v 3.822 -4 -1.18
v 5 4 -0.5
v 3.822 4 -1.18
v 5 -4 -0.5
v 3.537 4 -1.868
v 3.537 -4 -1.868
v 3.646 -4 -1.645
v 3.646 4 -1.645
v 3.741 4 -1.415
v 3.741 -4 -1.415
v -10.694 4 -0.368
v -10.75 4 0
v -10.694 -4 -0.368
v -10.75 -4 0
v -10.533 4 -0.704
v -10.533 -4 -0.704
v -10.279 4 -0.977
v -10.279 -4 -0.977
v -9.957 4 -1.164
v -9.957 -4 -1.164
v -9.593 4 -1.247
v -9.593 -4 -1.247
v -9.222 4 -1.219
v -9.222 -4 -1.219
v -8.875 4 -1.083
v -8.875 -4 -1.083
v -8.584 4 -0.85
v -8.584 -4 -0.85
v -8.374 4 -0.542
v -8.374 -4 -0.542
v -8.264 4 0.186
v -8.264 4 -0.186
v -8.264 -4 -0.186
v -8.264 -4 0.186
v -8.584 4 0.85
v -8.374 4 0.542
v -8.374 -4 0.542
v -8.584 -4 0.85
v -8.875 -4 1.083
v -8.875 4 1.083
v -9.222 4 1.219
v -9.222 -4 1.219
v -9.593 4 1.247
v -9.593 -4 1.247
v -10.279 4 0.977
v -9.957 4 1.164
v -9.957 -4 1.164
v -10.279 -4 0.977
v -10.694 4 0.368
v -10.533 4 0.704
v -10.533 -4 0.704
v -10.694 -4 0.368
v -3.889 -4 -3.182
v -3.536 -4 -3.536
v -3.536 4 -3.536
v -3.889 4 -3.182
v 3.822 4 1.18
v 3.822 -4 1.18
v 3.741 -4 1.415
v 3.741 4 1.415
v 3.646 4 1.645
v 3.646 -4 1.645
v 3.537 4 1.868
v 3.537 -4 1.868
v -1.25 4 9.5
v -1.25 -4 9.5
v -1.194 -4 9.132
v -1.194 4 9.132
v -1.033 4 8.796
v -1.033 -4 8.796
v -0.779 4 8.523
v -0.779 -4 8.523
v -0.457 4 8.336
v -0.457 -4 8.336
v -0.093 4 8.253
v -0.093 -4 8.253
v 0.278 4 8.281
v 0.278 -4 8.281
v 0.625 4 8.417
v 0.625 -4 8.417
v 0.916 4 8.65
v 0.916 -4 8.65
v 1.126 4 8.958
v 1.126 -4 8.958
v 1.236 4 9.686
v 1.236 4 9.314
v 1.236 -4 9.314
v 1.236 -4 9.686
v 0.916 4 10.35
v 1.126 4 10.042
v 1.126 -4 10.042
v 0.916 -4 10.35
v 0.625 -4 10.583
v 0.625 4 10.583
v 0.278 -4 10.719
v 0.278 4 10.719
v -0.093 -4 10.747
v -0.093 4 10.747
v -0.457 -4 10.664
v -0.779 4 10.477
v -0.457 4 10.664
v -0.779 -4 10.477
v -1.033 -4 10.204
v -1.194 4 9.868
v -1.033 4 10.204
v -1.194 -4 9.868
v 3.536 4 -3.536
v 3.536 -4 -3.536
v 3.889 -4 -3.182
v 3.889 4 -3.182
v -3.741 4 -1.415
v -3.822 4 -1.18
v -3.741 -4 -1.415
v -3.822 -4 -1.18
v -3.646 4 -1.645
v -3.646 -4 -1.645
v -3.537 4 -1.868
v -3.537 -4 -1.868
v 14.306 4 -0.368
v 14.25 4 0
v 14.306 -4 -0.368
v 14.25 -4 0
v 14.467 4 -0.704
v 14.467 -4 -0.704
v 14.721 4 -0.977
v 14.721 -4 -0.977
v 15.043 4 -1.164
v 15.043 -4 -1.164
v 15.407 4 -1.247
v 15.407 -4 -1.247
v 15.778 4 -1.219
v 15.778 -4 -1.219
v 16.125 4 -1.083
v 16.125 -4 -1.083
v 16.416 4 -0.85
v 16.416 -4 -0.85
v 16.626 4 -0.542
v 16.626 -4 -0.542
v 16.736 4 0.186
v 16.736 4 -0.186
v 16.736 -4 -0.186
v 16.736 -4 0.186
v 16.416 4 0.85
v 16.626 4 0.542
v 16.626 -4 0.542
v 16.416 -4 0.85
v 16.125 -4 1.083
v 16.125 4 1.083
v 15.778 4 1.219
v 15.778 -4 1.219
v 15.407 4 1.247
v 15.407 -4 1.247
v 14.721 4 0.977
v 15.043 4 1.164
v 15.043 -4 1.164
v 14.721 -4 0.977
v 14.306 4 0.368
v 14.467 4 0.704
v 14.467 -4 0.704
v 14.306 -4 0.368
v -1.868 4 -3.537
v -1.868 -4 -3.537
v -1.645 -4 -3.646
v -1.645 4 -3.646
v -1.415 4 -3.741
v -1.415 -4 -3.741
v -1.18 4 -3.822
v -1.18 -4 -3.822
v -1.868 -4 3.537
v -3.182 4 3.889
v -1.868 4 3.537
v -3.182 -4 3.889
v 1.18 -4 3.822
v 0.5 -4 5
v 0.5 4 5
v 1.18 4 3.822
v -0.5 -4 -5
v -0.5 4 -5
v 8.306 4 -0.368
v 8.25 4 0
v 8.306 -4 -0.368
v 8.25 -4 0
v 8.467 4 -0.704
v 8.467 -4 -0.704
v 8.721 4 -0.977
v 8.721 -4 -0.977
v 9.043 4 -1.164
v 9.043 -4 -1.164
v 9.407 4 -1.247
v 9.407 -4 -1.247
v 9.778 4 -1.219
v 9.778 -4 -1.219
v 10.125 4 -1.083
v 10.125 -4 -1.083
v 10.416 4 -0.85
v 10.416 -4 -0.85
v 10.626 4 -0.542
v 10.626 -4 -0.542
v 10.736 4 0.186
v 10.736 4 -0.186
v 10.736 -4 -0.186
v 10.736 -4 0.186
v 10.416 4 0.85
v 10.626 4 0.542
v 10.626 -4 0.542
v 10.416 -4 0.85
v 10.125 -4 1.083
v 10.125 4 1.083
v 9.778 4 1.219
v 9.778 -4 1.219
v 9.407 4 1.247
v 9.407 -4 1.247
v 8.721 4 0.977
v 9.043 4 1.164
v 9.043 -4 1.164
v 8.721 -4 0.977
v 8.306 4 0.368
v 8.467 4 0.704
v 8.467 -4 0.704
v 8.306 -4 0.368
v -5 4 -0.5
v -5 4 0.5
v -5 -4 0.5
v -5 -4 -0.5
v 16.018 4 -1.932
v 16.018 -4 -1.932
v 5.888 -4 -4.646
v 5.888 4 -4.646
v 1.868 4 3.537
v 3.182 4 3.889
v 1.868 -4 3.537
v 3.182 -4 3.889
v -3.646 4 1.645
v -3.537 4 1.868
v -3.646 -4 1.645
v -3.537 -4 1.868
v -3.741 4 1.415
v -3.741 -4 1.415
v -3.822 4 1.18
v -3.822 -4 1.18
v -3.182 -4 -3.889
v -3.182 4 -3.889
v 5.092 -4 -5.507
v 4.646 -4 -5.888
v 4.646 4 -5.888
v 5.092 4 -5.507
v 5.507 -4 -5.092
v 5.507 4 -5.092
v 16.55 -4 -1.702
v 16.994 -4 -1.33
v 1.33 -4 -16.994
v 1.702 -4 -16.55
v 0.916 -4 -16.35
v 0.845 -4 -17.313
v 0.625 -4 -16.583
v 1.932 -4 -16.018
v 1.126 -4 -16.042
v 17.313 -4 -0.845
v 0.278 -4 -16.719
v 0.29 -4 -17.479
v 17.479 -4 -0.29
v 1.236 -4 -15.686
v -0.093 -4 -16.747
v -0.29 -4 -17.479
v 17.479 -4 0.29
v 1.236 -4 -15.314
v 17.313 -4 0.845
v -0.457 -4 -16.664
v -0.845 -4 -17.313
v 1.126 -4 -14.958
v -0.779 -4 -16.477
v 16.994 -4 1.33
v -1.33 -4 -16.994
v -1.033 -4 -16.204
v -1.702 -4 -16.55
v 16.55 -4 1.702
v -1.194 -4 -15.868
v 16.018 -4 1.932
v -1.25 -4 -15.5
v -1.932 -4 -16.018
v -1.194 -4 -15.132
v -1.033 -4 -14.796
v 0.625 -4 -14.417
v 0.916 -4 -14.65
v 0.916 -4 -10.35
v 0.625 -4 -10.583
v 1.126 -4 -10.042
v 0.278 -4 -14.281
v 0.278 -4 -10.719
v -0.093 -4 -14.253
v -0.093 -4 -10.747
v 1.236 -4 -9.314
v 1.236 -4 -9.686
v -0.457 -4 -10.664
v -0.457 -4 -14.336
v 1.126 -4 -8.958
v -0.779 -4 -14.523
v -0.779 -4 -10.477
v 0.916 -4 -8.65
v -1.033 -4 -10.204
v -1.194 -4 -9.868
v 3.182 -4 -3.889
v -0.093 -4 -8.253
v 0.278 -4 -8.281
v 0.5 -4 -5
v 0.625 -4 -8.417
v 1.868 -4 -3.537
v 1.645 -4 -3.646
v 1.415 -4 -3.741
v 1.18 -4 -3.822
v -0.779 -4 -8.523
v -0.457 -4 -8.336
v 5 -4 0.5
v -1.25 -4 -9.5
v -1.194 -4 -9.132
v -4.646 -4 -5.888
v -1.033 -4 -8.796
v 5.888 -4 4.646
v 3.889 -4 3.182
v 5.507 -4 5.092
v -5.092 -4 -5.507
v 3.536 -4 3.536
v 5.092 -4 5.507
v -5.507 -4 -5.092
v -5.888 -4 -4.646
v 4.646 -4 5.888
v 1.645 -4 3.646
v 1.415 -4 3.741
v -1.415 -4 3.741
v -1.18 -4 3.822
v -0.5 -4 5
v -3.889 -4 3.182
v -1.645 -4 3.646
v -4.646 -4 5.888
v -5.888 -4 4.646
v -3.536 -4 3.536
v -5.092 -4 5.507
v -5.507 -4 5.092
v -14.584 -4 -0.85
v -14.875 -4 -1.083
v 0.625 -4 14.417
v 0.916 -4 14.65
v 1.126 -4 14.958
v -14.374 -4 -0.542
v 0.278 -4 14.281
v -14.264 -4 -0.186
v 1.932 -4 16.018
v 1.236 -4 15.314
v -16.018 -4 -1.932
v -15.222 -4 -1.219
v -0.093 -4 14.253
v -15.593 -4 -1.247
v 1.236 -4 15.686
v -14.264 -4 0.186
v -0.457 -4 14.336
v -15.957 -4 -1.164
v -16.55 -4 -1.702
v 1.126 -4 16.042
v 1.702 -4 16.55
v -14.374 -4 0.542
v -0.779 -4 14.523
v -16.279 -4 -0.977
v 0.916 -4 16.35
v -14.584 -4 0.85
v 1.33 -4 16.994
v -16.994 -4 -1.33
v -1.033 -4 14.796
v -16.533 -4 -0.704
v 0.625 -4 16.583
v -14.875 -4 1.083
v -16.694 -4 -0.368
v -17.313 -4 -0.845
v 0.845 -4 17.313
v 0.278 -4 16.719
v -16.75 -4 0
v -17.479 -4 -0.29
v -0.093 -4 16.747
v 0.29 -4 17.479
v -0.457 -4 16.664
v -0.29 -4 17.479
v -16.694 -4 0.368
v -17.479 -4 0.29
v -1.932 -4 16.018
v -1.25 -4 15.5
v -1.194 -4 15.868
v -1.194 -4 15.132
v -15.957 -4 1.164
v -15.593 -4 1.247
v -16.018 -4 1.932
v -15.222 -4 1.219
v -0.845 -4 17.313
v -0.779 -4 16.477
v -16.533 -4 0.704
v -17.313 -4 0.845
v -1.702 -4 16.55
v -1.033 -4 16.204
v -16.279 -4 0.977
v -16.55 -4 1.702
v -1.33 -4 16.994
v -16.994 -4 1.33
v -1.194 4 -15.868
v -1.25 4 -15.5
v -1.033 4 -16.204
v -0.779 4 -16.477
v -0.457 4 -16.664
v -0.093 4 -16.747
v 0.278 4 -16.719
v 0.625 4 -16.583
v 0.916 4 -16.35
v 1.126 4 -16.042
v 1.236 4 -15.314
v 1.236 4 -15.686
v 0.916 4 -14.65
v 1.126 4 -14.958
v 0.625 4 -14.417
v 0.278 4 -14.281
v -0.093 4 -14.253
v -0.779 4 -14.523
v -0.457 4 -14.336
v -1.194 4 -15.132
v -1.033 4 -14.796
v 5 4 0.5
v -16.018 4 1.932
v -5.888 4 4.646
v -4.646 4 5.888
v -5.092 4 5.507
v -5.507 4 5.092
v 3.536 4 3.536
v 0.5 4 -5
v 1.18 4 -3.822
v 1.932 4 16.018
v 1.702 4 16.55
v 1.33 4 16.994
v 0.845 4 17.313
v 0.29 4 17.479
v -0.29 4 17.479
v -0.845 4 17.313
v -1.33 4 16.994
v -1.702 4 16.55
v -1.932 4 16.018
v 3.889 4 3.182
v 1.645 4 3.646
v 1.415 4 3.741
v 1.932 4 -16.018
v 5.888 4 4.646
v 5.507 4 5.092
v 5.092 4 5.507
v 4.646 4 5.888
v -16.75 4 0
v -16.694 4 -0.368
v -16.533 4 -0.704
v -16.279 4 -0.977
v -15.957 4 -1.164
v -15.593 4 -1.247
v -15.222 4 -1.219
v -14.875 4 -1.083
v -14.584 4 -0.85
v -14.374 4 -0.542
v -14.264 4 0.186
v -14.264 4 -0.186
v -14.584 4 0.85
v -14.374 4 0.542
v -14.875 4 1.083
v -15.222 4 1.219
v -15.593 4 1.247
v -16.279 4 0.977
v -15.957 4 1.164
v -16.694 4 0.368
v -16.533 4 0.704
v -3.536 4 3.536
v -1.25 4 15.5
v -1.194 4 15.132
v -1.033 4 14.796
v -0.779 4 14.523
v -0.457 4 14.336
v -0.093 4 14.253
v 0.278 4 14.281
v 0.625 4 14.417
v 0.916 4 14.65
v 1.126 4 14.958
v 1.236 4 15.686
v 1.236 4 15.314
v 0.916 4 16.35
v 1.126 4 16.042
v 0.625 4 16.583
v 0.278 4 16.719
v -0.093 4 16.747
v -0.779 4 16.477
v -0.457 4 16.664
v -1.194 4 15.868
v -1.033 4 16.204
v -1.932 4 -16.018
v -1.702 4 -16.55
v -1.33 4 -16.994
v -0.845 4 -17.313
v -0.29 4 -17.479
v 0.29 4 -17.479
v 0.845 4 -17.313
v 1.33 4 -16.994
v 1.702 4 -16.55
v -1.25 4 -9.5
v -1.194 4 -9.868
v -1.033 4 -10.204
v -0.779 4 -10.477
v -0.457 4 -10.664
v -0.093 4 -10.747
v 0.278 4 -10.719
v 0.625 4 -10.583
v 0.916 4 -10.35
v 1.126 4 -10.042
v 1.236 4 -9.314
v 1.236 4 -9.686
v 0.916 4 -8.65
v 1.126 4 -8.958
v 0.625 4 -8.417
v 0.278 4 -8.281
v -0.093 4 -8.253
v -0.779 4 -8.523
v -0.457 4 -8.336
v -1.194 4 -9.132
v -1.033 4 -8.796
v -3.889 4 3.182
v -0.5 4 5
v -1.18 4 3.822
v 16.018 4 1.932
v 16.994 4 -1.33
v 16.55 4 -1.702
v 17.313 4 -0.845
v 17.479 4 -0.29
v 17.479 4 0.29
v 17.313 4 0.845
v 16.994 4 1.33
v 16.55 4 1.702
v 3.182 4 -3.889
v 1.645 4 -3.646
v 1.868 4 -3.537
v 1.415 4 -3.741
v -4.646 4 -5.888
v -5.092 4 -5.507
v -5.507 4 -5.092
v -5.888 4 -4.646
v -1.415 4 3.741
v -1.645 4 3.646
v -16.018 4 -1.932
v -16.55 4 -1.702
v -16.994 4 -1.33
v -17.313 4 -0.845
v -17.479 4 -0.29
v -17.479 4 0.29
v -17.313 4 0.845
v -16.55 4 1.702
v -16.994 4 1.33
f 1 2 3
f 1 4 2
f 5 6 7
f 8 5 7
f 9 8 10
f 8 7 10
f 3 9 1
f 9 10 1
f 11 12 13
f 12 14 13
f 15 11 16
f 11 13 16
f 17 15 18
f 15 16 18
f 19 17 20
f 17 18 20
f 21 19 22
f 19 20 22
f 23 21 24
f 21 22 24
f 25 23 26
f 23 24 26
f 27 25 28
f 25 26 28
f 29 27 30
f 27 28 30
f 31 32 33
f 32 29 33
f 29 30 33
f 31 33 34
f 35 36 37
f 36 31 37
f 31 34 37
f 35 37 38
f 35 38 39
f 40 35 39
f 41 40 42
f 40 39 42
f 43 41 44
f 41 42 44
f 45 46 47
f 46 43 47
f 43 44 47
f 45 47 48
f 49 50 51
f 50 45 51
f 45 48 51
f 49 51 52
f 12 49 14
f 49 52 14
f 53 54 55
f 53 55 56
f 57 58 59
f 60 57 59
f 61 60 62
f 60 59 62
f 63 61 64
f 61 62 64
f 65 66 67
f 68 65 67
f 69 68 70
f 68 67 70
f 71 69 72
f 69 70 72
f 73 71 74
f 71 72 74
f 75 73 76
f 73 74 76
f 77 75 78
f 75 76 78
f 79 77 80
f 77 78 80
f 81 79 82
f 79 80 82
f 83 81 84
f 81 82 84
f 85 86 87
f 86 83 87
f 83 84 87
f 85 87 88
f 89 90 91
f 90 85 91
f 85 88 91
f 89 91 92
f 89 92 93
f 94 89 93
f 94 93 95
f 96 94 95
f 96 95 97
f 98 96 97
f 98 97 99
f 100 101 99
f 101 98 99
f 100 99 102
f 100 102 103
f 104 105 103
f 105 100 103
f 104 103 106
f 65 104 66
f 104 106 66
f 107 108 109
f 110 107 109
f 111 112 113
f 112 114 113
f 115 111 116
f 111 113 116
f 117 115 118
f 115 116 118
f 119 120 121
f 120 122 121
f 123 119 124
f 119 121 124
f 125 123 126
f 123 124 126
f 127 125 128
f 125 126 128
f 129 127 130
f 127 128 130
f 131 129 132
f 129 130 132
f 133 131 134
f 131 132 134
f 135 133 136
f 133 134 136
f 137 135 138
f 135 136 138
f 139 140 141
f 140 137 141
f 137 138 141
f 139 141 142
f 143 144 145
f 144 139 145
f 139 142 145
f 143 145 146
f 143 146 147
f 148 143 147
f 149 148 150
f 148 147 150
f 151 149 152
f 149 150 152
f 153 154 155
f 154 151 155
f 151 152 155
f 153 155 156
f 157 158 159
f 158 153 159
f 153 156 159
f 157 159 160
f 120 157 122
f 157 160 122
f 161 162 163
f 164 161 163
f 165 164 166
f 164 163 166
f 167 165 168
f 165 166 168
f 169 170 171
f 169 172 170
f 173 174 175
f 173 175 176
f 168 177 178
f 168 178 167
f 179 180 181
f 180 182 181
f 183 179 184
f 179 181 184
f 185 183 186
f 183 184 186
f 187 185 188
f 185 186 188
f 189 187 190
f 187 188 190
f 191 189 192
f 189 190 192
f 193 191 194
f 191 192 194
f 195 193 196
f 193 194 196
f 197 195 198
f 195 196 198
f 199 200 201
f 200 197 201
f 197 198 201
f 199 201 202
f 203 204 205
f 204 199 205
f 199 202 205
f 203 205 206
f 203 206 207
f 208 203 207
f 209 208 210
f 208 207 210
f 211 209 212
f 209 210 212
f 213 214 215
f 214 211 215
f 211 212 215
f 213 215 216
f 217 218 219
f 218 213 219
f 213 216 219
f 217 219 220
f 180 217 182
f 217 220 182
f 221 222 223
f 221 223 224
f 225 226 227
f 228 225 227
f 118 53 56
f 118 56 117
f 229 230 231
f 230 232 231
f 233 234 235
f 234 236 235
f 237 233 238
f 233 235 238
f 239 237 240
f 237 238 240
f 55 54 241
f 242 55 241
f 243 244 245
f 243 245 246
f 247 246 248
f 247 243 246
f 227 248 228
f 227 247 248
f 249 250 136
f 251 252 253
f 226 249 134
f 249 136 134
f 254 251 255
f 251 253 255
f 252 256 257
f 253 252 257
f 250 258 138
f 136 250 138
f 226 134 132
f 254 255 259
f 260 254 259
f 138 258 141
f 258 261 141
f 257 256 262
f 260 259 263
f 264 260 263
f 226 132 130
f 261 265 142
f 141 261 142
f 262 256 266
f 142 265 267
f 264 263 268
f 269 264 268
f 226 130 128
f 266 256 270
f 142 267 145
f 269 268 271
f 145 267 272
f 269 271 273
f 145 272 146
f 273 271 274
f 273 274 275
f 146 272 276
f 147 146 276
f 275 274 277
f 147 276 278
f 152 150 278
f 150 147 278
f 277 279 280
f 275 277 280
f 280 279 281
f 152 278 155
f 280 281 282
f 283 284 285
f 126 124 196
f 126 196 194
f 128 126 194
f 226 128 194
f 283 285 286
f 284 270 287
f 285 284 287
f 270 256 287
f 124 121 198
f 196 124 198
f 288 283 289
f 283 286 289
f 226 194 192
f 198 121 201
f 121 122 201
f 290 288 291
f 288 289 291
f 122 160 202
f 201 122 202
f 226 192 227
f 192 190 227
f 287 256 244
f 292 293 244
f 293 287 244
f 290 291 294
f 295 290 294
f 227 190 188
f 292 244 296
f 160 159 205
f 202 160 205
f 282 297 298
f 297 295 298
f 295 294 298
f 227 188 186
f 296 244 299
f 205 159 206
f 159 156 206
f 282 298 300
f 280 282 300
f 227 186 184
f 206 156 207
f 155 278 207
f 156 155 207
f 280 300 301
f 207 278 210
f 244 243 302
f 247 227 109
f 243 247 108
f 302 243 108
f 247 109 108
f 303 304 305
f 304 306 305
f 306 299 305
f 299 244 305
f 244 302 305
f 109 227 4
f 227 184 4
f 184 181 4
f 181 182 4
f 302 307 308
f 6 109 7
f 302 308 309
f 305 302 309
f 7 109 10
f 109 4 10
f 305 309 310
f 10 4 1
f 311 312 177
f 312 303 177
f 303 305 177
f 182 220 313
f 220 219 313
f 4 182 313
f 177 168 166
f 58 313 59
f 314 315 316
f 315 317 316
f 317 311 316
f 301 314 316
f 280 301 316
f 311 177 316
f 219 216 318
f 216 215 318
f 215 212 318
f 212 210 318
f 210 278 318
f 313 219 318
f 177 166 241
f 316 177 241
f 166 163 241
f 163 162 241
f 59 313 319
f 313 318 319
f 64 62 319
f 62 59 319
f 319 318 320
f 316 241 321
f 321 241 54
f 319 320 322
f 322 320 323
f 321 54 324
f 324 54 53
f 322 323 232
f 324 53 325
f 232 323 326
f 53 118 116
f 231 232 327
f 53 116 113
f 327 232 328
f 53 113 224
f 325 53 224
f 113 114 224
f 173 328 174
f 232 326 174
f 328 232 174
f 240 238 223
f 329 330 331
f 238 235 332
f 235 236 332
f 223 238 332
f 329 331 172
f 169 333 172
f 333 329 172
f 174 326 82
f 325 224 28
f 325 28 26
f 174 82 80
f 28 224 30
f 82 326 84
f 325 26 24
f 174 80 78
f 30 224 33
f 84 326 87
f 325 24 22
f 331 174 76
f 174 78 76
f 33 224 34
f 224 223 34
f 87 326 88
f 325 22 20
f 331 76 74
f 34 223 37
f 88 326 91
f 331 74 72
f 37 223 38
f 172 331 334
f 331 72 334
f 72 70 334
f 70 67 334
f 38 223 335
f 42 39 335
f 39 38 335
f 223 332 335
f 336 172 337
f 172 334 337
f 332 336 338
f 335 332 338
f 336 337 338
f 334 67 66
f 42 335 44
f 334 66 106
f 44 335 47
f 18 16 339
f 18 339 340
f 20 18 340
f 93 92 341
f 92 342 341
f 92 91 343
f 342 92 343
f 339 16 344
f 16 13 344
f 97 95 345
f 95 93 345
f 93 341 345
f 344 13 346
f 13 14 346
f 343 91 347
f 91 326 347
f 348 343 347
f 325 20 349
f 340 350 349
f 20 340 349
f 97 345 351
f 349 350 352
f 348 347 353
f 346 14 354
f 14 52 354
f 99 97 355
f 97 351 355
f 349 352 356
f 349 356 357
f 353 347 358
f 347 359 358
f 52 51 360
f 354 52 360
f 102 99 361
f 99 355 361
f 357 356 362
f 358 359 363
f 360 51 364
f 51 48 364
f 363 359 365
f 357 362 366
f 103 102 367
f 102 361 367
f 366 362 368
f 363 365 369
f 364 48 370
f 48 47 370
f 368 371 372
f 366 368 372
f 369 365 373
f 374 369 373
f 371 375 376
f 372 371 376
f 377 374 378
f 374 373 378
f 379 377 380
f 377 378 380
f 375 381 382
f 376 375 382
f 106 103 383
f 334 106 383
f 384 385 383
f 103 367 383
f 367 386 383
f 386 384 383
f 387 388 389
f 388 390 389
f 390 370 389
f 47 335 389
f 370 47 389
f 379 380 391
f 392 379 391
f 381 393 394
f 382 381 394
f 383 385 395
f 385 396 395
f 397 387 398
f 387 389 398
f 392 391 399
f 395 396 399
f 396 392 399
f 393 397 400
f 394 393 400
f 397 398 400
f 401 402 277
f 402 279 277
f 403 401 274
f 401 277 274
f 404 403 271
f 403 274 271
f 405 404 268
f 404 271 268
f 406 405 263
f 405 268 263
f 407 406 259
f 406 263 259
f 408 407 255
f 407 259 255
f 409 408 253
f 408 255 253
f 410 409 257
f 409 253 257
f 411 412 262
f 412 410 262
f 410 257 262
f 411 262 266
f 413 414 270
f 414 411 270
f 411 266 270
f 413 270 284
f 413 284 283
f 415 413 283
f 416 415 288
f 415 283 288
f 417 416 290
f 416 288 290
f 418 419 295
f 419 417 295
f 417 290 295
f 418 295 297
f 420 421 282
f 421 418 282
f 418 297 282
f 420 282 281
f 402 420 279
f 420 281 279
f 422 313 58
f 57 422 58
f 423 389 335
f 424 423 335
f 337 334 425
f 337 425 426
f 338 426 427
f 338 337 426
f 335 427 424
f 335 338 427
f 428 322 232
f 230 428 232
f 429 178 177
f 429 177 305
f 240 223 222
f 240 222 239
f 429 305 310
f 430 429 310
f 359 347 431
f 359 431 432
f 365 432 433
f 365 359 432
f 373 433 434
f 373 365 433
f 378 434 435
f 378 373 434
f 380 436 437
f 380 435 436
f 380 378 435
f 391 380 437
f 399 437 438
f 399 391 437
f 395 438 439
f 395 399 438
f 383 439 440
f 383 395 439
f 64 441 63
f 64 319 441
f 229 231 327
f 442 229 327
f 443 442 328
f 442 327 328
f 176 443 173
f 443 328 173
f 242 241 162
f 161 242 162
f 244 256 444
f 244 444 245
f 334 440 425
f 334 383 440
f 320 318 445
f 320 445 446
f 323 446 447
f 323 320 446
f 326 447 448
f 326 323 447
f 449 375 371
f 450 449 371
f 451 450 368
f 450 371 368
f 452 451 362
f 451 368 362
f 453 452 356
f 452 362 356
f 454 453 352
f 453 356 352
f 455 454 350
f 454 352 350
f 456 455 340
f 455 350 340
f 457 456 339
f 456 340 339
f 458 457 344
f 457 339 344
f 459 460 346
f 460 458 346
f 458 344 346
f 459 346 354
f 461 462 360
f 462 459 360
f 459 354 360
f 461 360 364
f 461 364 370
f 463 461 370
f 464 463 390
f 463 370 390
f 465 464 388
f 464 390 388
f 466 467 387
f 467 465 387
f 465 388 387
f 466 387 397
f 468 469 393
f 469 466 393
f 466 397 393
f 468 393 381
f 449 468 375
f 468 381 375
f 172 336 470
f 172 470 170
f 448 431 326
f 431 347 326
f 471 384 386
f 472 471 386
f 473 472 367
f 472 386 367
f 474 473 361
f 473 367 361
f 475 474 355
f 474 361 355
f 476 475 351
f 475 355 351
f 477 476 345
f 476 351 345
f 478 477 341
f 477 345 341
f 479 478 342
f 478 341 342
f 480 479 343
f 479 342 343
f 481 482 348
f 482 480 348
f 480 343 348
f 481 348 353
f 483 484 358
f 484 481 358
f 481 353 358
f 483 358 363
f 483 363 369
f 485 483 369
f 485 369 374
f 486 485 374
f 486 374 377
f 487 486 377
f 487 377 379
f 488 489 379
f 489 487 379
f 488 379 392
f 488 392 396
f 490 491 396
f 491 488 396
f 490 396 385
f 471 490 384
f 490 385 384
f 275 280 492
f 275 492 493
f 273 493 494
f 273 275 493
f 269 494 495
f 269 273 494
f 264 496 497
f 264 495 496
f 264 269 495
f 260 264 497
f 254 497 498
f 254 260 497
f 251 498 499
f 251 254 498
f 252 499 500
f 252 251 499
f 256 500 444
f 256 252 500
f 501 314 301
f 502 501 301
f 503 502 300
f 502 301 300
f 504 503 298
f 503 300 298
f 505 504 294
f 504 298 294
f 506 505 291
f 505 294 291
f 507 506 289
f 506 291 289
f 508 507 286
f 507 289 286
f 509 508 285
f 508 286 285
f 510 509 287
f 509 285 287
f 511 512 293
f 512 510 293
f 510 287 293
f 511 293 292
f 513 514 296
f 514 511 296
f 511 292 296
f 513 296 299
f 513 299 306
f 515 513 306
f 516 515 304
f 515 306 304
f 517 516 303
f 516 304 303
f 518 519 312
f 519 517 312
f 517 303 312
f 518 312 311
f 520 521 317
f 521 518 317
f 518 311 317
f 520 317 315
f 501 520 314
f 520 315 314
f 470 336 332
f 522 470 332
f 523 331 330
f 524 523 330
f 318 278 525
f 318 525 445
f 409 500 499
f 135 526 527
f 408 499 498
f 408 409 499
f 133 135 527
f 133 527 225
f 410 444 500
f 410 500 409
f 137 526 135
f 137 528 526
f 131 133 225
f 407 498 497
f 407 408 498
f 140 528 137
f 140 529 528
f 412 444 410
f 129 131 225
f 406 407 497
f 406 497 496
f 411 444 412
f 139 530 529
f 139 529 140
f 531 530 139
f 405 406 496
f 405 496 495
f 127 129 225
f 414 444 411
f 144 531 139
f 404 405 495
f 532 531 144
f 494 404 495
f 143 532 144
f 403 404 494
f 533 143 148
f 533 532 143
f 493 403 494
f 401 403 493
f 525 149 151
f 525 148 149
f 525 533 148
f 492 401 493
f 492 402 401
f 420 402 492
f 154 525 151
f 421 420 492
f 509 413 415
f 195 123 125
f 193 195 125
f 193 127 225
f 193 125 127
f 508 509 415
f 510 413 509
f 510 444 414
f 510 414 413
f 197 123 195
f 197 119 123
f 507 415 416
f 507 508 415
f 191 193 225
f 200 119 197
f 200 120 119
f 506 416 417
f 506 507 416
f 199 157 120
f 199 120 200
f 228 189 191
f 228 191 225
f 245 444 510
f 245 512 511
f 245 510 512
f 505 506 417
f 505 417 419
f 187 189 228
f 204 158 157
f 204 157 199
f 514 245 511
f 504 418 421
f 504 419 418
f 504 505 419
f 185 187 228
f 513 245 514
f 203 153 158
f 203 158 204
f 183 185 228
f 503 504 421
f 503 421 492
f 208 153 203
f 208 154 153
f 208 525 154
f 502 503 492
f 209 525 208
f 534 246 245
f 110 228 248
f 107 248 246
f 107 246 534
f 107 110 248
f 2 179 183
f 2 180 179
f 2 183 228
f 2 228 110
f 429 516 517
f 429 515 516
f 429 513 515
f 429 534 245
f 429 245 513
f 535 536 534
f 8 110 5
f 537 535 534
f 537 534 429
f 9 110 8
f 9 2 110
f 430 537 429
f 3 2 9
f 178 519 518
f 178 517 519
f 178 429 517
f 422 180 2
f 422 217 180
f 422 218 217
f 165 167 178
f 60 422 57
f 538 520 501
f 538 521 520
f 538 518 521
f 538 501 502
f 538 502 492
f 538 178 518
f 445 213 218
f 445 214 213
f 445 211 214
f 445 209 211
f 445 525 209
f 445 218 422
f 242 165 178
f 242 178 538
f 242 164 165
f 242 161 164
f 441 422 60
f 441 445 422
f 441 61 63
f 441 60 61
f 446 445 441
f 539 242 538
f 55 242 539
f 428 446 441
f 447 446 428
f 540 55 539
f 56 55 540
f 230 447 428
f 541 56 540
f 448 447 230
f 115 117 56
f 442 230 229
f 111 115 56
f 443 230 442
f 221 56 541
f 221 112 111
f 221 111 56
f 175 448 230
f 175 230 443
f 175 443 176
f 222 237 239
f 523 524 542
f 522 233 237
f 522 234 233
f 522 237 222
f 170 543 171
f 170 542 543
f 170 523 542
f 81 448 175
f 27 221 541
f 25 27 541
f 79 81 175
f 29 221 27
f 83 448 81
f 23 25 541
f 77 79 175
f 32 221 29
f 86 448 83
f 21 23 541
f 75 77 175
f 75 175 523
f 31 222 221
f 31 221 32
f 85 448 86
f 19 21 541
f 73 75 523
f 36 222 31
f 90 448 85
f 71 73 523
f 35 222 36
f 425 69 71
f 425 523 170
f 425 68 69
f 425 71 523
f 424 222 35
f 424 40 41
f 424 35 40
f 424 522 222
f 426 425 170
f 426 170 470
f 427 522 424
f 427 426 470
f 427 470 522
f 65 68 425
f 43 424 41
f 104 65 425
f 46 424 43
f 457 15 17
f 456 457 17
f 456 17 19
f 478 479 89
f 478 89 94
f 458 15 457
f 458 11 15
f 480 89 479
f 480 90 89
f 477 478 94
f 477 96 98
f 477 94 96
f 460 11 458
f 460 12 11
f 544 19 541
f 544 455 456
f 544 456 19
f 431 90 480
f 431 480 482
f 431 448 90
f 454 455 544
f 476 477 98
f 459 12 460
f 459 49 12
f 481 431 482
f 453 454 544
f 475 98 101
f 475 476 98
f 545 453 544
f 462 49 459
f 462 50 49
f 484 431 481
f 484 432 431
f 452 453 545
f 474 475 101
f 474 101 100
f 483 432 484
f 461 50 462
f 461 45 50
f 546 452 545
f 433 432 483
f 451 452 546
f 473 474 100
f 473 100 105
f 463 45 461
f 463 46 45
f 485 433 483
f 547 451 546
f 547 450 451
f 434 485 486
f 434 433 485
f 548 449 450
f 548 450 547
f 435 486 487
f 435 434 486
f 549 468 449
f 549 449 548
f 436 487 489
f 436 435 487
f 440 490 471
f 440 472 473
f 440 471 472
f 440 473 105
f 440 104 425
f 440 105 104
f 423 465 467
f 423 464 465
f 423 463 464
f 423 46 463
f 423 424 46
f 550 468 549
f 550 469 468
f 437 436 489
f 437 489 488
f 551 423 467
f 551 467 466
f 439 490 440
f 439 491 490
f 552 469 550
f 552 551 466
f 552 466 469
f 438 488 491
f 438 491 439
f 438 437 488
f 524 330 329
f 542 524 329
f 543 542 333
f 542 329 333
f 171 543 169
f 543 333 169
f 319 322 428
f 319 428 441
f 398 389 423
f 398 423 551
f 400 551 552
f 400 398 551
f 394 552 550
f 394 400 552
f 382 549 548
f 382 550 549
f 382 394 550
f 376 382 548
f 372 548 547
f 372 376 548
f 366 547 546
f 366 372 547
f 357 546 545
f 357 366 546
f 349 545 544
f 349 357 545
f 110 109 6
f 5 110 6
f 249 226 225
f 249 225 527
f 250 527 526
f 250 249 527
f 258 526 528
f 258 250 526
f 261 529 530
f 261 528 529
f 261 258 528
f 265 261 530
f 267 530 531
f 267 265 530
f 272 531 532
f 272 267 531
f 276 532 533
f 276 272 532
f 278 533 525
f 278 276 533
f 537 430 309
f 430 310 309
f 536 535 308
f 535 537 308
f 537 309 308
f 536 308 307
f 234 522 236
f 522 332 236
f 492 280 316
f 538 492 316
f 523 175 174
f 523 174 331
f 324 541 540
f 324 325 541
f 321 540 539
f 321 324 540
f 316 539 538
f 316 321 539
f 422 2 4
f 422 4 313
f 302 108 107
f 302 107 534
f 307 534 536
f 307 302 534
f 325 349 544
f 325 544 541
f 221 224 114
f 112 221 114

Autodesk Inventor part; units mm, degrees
ref_plane "YZ Plane" through (0, 0, 0) normal (1, 0, 0) x (0, 1, 0)
ref_plane "XZ Plane" through (0, 0, 0) normal (0, 1, 0) x (-1, 0, 0)
ref_plane "XY Plane" through (0, 0, 0) normal (0, 0, 1) x (1, 0, 0)
sketch "Sketch1" plane through (0, 0, 0) normal (0, 1, 0) x (-1, 0, 0)
  circle A0 centre (0, 0) radius 4
  line L0 (4, 0) -> (5, 0) construction
  line L1 (5, 0) -> (5, -0.5)
  line L2 (5, -0.5) -> (3.8219, -1.1802)
  line L3 (5, 0) -> (5, 0.5)
  line L4 (5, 0.5) -> (3.8219, 1.1802)
  line L5 (3.8891, 3.182) -> (3.537, 1.868)
  line L6 (3.5355, 3.5355) -> (3.8891, 3.182)
  line L7 (3.5355, 3.5355) -> (3.182, 3.8891)
  line L8 (3.182, 3.8891) -> (1.868, 3.537)
  line L9 (0.5, 5) -> (1.1802, 3.8219)
  line L10 (0, 5) -> (0.5, 5)
  line L11 (0, 5) -> (-0.5, 5)
  line L12 (-0.5, 5) -> (-1.1802, 3.8219)
  line L13 (-3.182, 3.8891) -> (-1.868, 3.537)
  line L14 (-3.5355, 3.5355) -> (-3.182, 3.8891)
  line L15 (-3.5355, 3.5355) -> (-3.8891, 3.182)
  line L16 (-3.8891, 3.182) -> (-3.537, 1.868)
  line L17 (-5, 0.5) -> (-3.8219, 1.1802)
  line L18 (-5, 0) -> (-5, 0.5)
  line L19 (-5, 0) -> (-5, -0.5)
  line L20 (-5, -0.5) -> (-3.8219, -1.1802)
  line L21 (-3.8891, -3.182) -> (-3.537, -1.868)
  line L22 (-3.5355, -3.5355) -> (-3.8891, -3.182)
  line L23 (-3.5355, -3.5355) -> (-3.182, -3.8891)
  line L24 (-3.182, -3.8891) -> (-1.868, -3.537)
  line L25 (-0.5, -5) -> (-1.1802, -3.8219)
  line L26 (0, -5) -> (-0.5, -5)
  line L27 (0, -5) -> (0.5, -5)
  line L28 (0.5, -5) -> (1.1802, -3.8219)
  line L29 (3.182, -3.8891) -> (1.868, -3.537)
  line L30 (3.5355, -3.5355) -> (3.182, -3.8891)
  line L31 (3.5355, -3.5355) -> (3.8891, -3.182)
  line L32 (3.8891, -3.182) -> (3.537, -1.868)
  circle A1 centre (0, 0) radius 17.5 construction
  arc A2 (15.5, -2) -> (15.5, 2) centre (15.5, 0) ccw
  line L33 (15.5, 2) -> (0, 2) construction
  line L34 (15.5, -2) -> (0, -2) construction
  line L35 (16.0176, 1.9319) -> (5.8875, 4.6462)
  line L36 (20.0758, 0) -> (0, 0) construction
  line L37 (16.0176, -1.9319) -> (5.8875, -4.6462)
  line L38 (-1.9319, 16.0176) -> (-4.6462, 5.8875)
  line L39 (1.9319, 16.0176) -> (4.6462, 5.8875)
  arc A3 (2, 15.5) -> (-2, 15.5) centre (0, 15.5) ccw
  line L40 (-16.0176, -1.9319) -> (-5.8875, -4.6462)
  line L41 (-16.0176, 1.9319) -> (-5.8875, 4.6462)
  arc A4 (-15.5, 2) -> (-15.5, -2) centre (-15.5, 0) ccw
  line L42 (1.9319, -16.0176) -> (4.6462, -5.8875)
  line L43 (-1.9319, -16.0176) -> (-4.6462, -5.8875)
  arc A5 (-2, -15.5) -> (2, -15.5) centre (0, -15.5) ccw
  arc A6 (5.8875, 4.6462) -> (4.6462, 5.8875) centre (0, 0) ccw
  arc A7 (-4.6462, 5.8875) -> (-5.8875, 4.6462) centre (0, 0) ccw
  arc A8 (-5.8875, -4.6462) -> (-4.6462, -5.8875) centre (0, 0) ccw
  arc A9 (4.6462, -5.8875) -> (5.8875, -4.6462) centre (0, 0) ccw
  circle A10 centre (0, 15.5) radius 1.25
  circle A11 centre (0, 9.5) radius 1.25
  circle A12 centre (-9.5, 0) radius 1.25
  circle A13 centre (-15.5, 0) radius 1.25
  circle A14 centre (0, -9.5) radius 1.25
  circle A15 centre (0, -15.5) radius 1.25
  circle A16 centre (9.5, 0) radius 1.25
  circle A17 centre (15.5, 0) radius 1.25
  point P0 (-3.8219, -1.1802)
  point P1 (-3.8219, 1.1802)
  dimension "d0" = 8
  dimension "d1" = 120
  dimension "d2" = 1
  dimension "d3" = 0.5
  dimension "d4" = 5
  dimension "d7" = 360
  dimension "d9" = 35
  dimension "d11" = 4
  dimension "d14" = 15
  dimension "d15" = 0
  dimension "d18" = 360
  dimension "d20" = 7.5
  dimension "d21" = 0.8157
  dimension "d22" = 4.0798
  dimension "d23" = 7.9436
  dimension "d24" = 2.5
  dimension "d25" = 2.5
  dimension "d26" = 6
  dimension "d27" = 9.5
  dimension "d30" = 360
extrude "Extrusion1" add sketch "Sketch1" along normal mid plane 8
thread "Thread1" size "M2.5x0.45" class "6H" standard "ANSI Metric M Profile" full length
thread "Thread2" size "M2.5x0.45" class "6H" standard "ANSI Metric M Profile" full length
thread "Thread3" size "M2.5x0.45" class "6H" standard "ANSI Metric M Profile" full length
thread "Thread4" size "M2.5x0.45" class "6H" standard "ANSI Metric M Profile" full length
thread "Thread5" size "M2.5x0.45" class "6H" standard "ANSI Metric M Profile" full length
thread "Thread6" size "M2.5x0.45" class "6H" standard "ANSI Metric M Profile" full length
thread "Thread7" size "M2.5x0.45" class "6H" standard "ANSI Metric M Profile" full length
thread "Thread8" size "M2.5x0.45" class "6H" standard "ANSI Metric M Profile" full length
thread "Thread9" size "M2.5x0.45" class "6H" standard "ANSI Metric M Profile" full length
properties part number "servo horn" material "Titanium"
